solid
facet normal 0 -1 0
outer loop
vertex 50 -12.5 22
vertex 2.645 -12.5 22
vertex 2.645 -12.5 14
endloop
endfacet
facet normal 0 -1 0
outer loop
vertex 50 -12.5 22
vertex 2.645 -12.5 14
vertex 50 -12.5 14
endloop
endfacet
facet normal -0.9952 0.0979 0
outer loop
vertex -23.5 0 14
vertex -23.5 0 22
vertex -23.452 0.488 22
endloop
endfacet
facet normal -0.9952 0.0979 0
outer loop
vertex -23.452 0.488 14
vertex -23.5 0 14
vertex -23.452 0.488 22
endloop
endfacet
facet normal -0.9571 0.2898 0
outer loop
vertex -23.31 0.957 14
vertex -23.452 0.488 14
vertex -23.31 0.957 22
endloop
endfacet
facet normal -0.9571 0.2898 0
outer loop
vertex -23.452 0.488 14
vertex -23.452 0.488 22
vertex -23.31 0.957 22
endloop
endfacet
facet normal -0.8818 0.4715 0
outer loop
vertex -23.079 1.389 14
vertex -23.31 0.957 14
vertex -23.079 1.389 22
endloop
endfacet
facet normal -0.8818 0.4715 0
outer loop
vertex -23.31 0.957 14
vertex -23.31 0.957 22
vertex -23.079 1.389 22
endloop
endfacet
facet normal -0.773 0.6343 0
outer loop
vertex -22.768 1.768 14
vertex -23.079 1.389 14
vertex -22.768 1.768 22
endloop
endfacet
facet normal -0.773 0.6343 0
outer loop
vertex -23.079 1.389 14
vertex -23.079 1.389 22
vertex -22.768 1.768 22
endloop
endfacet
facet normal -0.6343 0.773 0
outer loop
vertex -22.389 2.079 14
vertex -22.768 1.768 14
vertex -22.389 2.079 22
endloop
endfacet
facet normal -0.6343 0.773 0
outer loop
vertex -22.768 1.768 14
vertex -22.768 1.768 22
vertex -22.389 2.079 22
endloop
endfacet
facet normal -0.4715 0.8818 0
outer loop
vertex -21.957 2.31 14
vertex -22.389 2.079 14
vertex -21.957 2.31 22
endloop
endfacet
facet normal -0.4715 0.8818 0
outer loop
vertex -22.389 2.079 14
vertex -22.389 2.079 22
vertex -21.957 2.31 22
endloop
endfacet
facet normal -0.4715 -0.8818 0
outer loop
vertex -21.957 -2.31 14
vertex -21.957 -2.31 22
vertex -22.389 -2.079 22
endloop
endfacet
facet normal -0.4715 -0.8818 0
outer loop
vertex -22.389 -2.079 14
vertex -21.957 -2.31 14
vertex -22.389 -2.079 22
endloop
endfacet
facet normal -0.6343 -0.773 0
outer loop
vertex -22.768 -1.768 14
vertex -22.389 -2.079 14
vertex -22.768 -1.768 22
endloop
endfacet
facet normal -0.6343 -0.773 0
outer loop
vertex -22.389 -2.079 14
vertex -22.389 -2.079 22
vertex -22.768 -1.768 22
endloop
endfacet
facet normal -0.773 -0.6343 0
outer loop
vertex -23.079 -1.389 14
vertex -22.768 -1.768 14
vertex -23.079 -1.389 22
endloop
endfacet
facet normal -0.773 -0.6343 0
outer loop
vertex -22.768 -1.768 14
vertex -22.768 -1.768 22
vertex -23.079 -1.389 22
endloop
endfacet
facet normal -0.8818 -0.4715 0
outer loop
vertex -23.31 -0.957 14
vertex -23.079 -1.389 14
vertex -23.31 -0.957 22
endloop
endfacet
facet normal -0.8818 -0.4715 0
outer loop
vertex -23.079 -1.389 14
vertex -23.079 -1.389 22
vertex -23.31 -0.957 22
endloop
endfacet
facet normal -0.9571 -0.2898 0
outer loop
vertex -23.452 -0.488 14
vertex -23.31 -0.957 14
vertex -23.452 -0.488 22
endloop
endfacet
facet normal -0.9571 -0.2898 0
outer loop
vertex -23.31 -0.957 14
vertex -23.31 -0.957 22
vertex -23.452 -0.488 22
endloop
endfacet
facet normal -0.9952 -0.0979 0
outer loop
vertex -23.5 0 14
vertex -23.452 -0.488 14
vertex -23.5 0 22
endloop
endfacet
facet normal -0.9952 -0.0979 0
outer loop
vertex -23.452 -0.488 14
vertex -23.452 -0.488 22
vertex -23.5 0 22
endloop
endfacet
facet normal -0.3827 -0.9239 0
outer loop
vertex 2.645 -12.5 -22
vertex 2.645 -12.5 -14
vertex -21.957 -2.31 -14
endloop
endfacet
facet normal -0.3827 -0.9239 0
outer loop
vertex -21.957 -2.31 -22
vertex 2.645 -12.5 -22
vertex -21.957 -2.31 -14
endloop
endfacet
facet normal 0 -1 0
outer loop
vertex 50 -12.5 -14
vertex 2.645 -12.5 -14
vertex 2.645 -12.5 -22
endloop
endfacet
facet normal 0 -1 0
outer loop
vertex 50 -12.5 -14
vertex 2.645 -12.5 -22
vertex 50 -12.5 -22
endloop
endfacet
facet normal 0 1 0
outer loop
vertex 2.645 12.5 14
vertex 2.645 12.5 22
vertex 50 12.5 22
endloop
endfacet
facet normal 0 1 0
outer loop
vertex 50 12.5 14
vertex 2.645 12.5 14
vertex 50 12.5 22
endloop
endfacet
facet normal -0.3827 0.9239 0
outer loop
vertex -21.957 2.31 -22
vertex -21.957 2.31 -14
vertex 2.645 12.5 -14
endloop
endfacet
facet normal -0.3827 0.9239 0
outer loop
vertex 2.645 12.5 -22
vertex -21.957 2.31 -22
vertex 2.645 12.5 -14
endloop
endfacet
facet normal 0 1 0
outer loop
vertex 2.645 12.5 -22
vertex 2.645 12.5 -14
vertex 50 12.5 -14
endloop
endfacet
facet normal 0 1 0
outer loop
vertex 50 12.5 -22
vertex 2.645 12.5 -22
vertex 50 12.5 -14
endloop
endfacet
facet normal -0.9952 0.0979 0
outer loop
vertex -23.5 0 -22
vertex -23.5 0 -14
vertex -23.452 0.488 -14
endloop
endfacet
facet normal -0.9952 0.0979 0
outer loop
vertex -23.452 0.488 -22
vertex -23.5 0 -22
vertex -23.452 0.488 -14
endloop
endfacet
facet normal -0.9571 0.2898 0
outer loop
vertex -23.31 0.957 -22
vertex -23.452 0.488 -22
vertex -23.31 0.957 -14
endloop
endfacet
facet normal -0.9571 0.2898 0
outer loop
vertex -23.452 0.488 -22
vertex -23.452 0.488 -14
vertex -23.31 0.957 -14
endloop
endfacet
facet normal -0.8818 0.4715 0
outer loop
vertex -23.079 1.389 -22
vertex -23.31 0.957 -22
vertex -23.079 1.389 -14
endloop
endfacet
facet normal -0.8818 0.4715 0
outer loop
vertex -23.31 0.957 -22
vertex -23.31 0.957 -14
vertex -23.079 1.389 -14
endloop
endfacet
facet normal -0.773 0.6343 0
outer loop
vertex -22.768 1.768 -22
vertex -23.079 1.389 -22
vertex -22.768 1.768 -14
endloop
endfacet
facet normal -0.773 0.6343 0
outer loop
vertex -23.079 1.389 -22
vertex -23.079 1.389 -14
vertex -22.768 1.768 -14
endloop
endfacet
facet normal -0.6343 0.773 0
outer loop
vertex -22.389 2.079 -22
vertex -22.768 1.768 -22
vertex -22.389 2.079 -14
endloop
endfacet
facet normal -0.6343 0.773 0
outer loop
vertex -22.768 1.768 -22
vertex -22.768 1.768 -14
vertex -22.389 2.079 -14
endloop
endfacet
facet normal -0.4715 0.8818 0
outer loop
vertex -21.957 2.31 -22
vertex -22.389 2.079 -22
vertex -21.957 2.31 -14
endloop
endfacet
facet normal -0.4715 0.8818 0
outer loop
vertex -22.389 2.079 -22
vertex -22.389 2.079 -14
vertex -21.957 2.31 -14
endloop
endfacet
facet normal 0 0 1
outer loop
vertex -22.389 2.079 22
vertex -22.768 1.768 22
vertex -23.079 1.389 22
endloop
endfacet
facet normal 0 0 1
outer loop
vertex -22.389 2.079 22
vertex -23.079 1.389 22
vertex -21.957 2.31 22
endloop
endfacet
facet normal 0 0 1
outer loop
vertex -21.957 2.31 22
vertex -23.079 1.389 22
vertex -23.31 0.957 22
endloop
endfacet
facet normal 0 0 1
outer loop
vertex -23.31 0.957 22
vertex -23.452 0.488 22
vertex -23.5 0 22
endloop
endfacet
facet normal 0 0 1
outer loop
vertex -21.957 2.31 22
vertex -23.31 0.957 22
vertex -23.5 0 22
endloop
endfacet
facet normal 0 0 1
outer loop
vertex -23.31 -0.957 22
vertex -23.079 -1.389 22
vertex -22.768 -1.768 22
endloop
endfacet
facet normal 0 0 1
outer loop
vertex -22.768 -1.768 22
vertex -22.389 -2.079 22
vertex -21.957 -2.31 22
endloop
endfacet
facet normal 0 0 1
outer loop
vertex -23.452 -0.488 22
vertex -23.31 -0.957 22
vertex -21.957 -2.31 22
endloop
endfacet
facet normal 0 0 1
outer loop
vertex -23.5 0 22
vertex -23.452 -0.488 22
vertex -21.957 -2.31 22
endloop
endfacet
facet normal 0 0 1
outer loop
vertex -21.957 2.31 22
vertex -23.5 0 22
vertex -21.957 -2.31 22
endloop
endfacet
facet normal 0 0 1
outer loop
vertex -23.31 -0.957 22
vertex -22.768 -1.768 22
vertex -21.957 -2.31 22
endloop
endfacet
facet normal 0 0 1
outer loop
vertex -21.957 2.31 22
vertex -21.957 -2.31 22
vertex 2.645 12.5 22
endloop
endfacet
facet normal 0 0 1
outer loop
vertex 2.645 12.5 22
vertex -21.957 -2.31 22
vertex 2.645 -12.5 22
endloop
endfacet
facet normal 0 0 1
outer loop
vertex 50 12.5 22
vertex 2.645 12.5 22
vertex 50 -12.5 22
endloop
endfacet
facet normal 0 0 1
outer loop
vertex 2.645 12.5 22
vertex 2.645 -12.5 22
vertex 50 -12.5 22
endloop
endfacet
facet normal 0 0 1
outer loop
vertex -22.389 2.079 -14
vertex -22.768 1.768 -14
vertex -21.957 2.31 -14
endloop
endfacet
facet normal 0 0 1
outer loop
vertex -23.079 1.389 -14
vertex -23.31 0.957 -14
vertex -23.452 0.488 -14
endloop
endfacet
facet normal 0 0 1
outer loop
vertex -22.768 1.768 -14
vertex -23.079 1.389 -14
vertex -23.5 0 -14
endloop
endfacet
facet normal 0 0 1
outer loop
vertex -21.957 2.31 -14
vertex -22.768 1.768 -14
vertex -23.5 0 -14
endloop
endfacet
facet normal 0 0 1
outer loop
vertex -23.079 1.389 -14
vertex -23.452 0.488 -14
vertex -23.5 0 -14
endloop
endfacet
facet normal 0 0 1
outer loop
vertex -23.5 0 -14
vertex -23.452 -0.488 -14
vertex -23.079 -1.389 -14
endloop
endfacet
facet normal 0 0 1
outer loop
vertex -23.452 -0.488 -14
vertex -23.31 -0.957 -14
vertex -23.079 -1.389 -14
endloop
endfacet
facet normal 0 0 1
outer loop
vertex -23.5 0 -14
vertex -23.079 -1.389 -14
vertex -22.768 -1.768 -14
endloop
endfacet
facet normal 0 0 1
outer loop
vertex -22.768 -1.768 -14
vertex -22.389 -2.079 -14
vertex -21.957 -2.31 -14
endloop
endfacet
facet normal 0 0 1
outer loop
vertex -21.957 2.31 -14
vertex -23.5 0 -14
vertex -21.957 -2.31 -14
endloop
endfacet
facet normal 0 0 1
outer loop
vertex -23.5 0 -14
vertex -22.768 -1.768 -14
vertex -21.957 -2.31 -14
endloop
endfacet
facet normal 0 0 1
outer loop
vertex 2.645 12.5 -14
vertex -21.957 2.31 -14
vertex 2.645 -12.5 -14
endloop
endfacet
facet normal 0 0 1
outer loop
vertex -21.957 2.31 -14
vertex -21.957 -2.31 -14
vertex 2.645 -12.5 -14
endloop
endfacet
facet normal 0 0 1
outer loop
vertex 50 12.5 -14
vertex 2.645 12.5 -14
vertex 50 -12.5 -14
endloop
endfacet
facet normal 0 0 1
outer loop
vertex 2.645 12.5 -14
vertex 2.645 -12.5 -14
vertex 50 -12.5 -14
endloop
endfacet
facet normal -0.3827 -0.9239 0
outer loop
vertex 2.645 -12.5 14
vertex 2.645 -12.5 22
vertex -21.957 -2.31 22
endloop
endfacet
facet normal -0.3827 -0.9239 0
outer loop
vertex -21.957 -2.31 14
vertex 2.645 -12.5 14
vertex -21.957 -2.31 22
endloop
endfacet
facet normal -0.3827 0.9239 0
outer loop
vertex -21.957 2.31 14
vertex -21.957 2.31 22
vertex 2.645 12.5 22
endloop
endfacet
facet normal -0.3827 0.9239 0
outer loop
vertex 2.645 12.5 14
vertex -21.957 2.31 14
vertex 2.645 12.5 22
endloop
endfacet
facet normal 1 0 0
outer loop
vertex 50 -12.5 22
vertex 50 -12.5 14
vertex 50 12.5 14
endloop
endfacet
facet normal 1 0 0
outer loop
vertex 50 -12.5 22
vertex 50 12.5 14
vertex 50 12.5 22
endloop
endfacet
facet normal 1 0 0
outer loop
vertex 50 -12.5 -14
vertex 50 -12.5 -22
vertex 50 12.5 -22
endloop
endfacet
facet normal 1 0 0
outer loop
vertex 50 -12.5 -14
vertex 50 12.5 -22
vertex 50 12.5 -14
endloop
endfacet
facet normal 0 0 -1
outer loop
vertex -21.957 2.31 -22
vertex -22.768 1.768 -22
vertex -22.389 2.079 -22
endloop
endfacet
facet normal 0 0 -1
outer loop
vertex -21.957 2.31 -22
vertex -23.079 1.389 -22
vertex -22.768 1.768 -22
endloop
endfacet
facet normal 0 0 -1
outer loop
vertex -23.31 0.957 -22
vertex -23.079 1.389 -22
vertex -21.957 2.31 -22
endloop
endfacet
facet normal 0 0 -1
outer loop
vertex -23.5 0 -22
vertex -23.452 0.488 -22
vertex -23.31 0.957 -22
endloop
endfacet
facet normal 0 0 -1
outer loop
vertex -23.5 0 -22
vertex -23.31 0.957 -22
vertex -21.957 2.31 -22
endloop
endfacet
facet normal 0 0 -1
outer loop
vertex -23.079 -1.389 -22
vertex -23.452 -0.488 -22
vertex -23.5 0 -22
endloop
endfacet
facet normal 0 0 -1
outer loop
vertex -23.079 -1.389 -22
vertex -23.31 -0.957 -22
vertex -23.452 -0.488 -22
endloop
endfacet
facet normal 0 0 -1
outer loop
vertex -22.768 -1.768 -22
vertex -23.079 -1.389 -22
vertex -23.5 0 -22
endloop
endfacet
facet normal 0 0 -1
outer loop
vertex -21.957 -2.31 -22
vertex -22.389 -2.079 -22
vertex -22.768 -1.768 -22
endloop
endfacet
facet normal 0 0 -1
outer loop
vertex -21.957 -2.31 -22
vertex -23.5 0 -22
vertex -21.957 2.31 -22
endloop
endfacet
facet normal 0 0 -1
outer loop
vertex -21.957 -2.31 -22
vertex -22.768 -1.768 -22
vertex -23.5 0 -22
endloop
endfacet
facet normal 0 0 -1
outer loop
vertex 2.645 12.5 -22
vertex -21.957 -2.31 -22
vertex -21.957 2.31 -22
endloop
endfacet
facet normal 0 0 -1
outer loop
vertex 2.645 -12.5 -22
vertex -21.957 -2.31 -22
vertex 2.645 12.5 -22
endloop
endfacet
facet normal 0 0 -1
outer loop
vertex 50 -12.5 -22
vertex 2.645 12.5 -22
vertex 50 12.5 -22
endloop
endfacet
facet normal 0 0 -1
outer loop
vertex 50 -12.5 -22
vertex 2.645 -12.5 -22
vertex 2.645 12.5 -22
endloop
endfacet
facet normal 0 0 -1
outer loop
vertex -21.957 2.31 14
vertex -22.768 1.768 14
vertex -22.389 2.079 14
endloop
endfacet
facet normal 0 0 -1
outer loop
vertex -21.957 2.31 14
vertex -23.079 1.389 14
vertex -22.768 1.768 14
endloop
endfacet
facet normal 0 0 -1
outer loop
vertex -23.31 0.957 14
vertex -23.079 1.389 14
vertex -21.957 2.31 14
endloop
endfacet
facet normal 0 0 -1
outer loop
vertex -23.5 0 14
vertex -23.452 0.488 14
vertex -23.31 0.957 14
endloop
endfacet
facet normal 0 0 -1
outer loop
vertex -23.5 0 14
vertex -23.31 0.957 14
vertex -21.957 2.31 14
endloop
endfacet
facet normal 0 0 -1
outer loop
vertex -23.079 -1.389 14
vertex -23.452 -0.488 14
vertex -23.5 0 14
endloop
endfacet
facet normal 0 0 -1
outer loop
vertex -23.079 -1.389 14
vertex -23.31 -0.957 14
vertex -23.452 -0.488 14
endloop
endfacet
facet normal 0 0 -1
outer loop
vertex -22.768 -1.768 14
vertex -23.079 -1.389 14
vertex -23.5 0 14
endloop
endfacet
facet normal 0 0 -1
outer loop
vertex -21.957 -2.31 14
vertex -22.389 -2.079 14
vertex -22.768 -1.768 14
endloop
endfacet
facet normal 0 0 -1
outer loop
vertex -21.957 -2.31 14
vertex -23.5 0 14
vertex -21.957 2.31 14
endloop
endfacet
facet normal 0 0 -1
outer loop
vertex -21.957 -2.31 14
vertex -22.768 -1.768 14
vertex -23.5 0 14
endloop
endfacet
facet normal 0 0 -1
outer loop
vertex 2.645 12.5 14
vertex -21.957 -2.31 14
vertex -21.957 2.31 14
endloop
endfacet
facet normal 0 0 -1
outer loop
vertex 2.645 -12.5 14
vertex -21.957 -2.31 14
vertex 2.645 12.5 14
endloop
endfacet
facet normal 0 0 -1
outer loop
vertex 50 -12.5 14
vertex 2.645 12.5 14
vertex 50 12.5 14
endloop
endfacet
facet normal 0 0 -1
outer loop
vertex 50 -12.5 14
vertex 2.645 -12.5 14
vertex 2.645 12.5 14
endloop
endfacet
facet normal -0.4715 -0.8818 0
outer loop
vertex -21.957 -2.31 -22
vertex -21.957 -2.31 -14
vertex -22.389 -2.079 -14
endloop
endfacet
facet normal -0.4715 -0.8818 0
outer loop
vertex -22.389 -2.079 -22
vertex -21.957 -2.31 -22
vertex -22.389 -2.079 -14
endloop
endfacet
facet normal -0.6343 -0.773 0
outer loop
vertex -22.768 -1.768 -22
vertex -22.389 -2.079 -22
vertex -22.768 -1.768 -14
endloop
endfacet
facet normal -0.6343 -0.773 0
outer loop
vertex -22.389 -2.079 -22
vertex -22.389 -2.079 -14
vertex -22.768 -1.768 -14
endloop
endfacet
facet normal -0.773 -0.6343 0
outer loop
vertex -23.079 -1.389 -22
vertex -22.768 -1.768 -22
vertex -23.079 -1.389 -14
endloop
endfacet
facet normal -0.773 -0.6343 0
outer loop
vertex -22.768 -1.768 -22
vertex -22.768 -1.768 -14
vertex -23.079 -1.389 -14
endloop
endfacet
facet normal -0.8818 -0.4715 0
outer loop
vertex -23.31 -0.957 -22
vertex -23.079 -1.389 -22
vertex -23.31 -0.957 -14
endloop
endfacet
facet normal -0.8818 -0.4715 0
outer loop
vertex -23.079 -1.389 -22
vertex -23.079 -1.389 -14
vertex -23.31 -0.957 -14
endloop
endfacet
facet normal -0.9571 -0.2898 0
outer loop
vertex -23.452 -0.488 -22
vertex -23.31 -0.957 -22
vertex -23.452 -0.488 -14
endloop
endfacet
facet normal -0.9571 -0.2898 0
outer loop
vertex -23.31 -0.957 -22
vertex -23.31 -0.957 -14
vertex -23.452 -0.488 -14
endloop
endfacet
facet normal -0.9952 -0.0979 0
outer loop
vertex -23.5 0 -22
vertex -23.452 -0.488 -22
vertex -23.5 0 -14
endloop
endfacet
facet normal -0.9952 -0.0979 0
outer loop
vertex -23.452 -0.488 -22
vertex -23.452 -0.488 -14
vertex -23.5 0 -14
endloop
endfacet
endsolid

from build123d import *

# Parameters (mm, degrees)
F2_W          = 73.5
F2_H          = 8
F3_DEPTH      = 12.5
F3_DEPTH_BACK = 12.5
F4_DEPTH      = 12.5
F4_DEPTH_BACK = 12.5
F6_DEPTH      = 44.001


with BuildPart() as f3:
    # F2 (on Front) → F3 (new body, two sides)
    with BuildSketch(Plane.XZ) as f3_sk:
        with Locations((13.25, 18)):
            Rectangle(F2_W, F2_H)
    extrude(amount=F3_DEPTH)
    extrude(f3_sk.sketch, amount=-F3_DEPTH_BACK)


with BuildPart() as f4:
    # F2 (on Front) → F4 (new body, two sides)
    with BuildSketch(Plane.XZ) as f4_sk:
        with Locations((13.25, -18)):
            Rectangle(F2_W, F2_H)
    extrude(amount=F4_DEPTH)
    extrude(f4_sk.sketch, amount=-F4_DEPTH_BACK)


with BuildPart() as f6_tool:
    # F5 (on face) → F6 (new body, through all)
    with BuildSketch(Plane.XY.offset(22)):
        with BuildLine():
            ThreePointArc((-23.5, 0), (-23.078674, 1.388926), (-21.956709, 2.309699))
            Line((-21.956709, 2.309699), (2.644855, 12.5))
            Line((2.644855, 12.5), (-23.5, 12.5))
            Line((-23.5, 12.5), (-23.5, 0))
        make_face()
        with BuildLine():
            ThreePointArc((-21.956709, -2.309699), (-23.078674, -1.388926), (-23.5, 0))
            Line((-23.5, 0), (-23.5, -12.5))
            Line((-23.5, -12.5), (2.644855, -12.5))
            Line((2.644855, -12.5), (-21.956709, -2.309699))
        make_face()
    extrude(amount=-F6_DEPTH)


with BuildPart() as f3_1:
    add(f3.part)

    # F6: cut by f6_tool
    add(f6_tool.part, mode=Mode.SUBTRACT)


with BuildPart() as f4_1:
    add(f4.part)

    # F6: cut by f6_tool
    add(f6_tool.part, mode=Mode.SUBTRACT)


solid = Compound([f3_1.part, f4_1.part])
